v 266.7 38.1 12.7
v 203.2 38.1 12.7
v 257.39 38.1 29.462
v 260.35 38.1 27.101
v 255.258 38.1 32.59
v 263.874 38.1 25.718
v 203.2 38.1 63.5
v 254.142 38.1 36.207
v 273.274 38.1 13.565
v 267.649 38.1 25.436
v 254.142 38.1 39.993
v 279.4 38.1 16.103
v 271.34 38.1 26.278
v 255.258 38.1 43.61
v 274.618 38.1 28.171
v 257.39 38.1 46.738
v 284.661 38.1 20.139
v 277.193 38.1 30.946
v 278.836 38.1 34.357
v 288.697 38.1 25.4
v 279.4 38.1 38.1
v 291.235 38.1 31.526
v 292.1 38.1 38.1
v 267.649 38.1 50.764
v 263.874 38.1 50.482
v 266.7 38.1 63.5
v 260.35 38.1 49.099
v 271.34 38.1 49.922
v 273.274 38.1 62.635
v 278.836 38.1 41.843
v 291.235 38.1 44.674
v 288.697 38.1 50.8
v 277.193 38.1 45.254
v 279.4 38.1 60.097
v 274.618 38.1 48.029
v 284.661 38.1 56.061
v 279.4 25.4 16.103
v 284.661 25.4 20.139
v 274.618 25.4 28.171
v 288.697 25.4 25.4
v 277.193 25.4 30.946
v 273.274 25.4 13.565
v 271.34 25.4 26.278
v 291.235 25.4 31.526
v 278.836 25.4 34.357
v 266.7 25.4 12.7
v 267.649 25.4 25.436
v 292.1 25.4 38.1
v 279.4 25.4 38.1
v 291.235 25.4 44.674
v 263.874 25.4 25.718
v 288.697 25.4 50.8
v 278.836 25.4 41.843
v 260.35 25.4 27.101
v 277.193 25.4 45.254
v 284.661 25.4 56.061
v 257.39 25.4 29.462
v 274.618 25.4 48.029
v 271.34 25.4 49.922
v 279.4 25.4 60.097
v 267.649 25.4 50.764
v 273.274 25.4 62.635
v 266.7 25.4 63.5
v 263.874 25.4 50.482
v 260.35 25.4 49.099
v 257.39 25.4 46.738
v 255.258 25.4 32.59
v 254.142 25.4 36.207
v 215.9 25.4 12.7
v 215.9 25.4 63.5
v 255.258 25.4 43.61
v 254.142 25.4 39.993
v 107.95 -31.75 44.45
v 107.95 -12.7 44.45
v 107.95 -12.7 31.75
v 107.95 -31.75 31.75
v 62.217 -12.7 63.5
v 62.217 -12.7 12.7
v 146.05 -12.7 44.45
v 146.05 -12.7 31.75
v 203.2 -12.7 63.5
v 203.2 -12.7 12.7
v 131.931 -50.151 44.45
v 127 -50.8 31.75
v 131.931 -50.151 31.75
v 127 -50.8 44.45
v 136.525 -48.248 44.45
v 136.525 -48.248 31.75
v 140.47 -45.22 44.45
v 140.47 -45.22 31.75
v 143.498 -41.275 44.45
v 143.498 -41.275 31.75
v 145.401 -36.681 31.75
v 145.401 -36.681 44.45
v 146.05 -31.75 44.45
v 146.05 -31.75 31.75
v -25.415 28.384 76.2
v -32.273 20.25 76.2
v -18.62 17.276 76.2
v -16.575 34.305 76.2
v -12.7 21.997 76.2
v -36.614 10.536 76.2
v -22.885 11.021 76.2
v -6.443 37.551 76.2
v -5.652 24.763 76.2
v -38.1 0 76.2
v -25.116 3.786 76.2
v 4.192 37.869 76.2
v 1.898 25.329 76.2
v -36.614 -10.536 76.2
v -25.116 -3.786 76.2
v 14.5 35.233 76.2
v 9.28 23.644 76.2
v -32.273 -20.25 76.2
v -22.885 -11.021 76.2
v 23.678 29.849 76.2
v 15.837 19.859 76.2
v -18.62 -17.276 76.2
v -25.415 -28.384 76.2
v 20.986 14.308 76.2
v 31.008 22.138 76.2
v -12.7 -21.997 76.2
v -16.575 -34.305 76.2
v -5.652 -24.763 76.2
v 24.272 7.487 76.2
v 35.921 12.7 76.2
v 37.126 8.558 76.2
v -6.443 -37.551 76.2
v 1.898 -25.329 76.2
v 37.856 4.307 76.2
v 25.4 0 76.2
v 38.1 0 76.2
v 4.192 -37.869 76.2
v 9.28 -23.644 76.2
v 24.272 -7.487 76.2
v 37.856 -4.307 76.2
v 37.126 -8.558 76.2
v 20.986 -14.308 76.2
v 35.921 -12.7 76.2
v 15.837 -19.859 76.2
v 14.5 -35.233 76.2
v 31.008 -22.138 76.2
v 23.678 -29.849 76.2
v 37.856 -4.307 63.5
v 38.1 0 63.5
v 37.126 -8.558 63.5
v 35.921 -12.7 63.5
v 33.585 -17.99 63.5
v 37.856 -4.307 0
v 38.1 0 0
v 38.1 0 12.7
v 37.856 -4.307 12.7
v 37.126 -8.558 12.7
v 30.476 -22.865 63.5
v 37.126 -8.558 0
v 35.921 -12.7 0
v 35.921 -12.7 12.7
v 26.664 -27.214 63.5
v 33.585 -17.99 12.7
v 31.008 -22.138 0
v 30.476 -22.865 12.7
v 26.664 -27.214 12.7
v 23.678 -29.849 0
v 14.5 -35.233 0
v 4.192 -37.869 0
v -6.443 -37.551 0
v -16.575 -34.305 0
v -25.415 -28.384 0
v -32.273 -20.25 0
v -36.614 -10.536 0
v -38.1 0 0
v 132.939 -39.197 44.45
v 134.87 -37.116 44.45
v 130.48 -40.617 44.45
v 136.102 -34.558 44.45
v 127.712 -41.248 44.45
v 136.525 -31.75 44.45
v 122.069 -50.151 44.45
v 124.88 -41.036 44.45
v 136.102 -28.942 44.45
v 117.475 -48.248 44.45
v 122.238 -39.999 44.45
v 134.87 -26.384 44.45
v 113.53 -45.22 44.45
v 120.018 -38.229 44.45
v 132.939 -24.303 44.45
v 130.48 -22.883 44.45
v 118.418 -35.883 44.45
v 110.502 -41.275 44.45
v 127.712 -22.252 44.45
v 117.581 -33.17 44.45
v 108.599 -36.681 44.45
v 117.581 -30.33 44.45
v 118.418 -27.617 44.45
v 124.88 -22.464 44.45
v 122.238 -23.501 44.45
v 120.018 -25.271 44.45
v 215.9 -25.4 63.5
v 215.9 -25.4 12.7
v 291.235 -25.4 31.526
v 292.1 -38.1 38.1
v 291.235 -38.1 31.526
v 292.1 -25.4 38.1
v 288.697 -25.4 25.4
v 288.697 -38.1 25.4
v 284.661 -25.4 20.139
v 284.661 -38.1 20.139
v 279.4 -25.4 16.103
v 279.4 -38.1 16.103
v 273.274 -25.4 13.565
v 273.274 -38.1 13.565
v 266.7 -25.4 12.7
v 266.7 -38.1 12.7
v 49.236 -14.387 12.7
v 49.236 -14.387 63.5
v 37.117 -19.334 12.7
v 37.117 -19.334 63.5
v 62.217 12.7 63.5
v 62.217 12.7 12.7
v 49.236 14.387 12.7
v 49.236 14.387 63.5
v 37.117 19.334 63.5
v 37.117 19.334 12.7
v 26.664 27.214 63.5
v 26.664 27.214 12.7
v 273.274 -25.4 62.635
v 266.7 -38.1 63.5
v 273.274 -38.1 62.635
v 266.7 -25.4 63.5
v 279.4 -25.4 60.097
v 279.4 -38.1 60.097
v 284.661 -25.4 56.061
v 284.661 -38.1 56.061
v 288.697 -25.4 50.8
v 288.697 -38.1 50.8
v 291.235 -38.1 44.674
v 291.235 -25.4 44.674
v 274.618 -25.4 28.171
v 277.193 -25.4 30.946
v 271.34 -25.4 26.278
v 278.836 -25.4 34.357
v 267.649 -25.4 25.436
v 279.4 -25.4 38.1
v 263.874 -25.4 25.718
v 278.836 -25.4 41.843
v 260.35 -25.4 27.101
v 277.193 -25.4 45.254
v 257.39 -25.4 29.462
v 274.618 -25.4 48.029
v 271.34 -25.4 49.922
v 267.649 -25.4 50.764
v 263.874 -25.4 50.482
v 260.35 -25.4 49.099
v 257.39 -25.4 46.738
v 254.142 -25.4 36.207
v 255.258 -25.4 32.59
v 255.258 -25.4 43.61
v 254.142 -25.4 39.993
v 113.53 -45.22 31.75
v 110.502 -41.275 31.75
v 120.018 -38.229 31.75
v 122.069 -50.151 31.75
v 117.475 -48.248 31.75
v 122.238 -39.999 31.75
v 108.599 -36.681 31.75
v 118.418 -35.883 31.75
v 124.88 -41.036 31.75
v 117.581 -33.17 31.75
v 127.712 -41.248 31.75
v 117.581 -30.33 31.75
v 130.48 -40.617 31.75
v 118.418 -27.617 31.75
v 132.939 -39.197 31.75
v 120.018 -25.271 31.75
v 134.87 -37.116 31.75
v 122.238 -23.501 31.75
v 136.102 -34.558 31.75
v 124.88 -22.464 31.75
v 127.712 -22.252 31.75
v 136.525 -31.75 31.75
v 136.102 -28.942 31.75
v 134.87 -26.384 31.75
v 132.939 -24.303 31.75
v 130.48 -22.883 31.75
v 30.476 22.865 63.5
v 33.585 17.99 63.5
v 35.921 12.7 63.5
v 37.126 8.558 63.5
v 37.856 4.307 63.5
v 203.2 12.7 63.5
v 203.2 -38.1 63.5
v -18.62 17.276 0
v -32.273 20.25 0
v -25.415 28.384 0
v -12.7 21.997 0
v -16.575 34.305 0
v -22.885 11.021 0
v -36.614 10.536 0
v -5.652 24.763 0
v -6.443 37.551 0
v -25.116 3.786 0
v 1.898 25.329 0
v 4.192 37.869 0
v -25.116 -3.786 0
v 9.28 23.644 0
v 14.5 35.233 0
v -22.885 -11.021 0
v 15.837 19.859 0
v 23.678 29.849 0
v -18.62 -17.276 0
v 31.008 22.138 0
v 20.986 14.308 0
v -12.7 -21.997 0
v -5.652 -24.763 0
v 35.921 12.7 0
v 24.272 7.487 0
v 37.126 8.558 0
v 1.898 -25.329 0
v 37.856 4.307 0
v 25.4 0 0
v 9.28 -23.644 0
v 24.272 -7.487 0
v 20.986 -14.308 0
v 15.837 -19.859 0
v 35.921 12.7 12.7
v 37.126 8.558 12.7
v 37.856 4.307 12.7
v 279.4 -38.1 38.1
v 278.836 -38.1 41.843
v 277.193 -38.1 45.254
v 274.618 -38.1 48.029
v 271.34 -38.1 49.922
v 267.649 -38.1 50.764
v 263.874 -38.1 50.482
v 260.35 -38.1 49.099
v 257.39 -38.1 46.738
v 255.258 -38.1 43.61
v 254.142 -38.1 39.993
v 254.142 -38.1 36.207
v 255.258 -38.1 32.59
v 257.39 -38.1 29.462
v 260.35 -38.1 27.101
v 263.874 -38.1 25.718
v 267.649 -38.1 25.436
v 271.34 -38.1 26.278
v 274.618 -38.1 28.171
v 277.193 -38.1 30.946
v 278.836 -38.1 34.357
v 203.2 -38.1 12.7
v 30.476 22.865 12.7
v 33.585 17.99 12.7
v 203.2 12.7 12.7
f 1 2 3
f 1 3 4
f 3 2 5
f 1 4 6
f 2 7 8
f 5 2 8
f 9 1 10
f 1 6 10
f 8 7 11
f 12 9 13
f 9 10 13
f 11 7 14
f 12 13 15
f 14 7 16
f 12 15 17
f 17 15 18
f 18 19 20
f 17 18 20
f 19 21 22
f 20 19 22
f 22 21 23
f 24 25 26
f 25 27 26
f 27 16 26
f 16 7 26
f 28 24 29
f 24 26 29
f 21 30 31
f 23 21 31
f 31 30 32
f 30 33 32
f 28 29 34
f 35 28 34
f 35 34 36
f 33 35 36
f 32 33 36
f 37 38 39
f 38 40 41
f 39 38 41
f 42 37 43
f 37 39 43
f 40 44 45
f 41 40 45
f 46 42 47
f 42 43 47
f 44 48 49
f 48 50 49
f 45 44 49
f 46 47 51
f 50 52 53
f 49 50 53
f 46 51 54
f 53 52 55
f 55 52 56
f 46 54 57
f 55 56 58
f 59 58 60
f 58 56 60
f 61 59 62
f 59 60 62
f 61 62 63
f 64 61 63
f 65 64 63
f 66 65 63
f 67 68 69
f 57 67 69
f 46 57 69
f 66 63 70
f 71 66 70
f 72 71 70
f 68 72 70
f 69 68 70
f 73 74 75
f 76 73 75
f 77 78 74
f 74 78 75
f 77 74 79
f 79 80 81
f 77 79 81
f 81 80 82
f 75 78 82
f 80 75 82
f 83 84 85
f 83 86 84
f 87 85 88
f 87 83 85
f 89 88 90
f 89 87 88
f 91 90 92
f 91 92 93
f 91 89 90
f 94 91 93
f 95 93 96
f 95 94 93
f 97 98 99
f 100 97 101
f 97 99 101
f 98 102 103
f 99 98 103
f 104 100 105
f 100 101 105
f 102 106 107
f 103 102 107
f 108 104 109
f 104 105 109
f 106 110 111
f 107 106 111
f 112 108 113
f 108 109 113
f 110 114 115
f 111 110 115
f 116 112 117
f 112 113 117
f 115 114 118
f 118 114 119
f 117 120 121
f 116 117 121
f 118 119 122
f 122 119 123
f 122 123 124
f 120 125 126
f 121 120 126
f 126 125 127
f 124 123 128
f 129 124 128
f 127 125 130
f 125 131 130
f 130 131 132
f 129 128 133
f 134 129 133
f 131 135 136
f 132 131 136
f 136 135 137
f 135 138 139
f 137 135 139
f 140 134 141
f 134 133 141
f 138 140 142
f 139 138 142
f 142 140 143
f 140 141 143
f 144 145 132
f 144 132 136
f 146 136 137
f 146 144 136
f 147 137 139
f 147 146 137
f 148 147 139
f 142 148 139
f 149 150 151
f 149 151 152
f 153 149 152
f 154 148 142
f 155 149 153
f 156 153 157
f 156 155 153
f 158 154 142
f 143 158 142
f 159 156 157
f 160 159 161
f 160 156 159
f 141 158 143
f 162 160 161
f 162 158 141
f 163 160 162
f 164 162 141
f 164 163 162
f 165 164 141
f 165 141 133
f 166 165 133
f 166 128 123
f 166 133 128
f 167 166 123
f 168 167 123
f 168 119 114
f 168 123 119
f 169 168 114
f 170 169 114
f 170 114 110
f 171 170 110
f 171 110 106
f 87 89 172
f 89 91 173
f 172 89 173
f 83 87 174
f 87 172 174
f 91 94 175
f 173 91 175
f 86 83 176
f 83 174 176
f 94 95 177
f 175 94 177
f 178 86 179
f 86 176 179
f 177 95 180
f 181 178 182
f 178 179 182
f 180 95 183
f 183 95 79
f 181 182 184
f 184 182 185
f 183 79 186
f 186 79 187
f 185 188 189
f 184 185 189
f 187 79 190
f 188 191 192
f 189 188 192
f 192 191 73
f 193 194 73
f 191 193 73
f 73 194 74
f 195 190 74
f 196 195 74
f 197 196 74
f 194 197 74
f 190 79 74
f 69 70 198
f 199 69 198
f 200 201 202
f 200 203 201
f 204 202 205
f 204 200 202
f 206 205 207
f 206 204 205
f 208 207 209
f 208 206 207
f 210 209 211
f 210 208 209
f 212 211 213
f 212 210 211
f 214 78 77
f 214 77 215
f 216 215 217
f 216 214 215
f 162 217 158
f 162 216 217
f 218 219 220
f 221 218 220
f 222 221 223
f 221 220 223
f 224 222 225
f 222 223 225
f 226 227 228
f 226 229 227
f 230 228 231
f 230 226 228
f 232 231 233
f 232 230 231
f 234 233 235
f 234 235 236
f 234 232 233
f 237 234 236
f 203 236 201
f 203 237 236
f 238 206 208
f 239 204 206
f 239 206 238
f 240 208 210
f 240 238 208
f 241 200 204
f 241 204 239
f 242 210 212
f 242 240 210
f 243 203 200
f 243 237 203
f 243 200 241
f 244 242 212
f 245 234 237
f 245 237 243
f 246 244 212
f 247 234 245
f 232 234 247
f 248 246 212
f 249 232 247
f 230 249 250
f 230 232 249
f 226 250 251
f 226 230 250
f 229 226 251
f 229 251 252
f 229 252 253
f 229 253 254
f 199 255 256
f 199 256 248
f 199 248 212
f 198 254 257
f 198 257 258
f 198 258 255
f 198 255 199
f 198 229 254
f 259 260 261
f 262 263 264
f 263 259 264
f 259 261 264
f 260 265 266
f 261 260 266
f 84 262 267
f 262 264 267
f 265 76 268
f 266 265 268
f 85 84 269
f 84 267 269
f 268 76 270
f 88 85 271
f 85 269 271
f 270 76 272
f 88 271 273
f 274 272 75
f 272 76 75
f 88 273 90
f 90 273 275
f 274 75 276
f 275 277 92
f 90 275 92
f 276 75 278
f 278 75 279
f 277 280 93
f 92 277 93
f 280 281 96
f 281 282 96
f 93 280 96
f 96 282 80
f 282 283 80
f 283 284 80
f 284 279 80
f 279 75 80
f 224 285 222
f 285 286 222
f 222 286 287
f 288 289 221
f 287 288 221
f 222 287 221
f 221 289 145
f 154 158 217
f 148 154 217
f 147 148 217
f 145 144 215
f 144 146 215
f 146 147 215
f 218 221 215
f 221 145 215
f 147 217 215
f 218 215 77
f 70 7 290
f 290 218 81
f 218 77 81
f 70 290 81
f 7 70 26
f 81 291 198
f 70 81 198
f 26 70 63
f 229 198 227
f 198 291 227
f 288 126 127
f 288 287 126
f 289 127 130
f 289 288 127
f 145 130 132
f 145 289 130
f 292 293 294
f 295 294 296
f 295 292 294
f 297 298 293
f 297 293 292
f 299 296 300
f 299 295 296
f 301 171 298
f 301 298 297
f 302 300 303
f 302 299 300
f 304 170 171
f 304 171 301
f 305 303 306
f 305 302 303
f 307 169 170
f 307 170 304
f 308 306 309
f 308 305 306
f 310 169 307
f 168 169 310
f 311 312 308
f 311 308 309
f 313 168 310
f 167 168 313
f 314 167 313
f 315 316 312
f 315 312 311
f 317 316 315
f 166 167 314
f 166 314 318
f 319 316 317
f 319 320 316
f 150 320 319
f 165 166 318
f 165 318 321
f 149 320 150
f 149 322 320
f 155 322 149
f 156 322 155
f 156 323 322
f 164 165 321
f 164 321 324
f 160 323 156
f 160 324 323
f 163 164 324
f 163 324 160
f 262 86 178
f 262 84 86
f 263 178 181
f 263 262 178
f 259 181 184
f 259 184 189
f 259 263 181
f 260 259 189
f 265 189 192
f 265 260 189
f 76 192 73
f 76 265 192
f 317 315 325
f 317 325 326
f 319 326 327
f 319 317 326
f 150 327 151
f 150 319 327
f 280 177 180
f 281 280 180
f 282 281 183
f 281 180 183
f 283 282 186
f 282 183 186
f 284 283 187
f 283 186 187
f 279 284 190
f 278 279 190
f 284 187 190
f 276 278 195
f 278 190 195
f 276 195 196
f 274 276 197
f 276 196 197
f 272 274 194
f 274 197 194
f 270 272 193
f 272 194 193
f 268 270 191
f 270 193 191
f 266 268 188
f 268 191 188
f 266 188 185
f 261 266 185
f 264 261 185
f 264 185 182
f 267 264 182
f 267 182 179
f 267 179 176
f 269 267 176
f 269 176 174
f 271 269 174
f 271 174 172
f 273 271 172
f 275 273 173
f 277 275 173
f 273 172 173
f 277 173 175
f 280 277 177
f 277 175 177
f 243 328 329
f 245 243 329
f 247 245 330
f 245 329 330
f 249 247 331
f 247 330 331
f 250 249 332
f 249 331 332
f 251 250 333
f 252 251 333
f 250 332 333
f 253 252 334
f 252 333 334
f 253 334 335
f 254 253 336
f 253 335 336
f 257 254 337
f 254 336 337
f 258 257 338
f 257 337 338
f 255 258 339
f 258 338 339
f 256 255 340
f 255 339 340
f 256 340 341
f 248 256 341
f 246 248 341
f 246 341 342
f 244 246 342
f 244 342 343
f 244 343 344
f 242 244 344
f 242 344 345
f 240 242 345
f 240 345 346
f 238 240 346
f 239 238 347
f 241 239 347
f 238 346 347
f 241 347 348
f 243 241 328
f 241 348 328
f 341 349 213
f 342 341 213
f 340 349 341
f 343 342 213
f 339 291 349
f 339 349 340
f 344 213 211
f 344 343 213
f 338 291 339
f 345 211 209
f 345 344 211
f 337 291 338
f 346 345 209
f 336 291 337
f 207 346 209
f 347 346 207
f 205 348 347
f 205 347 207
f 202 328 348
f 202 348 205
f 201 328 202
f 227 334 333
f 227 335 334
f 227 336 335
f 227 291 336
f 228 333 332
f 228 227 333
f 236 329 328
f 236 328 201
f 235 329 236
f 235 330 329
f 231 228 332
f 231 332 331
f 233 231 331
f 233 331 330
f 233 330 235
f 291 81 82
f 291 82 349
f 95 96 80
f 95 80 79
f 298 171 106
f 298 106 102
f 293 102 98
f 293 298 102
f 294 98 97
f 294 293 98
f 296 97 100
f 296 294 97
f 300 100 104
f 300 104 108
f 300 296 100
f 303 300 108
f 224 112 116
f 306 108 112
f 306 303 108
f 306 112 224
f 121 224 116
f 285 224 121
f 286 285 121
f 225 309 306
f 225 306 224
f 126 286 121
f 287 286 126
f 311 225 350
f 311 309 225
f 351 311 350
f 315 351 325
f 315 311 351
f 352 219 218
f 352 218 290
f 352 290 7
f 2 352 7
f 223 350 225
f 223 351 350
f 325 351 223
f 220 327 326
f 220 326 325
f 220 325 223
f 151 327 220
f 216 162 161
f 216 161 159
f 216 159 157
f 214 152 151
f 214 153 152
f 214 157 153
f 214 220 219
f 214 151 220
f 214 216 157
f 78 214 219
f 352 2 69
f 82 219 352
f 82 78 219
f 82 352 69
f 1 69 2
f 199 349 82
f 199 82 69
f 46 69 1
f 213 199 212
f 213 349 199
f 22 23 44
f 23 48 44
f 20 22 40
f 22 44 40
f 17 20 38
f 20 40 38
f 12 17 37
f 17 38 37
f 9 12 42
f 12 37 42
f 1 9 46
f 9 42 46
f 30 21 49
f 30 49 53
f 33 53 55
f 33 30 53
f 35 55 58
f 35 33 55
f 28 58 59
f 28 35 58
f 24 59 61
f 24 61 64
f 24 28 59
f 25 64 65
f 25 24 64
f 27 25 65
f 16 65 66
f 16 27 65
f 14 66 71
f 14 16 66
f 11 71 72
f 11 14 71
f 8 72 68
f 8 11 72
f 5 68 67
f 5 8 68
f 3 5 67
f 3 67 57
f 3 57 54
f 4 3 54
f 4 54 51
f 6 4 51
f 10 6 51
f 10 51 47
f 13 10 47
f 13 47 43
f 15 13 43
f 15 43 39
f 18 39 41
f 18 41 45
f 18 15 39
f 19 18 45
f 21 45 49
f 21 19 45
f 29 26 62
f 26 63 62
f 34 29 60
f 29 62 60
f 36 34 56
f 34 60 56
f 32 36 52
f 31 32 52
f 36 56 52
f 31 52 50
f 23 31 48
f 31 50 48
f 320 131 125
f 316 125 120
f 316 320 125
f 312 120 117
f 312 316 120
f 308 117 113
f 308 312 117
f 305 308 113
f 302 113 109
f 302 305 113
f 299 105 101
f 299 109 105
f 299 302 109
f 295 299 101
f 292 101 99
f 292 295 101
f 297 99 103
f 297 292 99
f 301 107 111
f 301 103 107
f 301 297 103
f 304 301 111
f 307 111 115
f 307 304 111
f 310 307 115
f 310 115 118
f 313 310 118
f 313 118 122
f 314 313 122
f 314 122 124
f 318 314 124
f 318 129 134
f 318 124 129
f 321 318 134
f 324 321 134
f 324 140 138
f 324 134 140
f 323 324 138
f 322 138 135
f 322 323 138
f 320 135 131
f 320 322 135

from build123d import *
from build123d import SkipClean  # not in build123d's __all__

# Parameters (mm, degrees)
F1_DEPTH    = 76.2
F3_DEPTH    = 12.7
F4_DEPTH    = 12.7
F5_T1_DEPTH = 50.8
F7_DEPTH    = 50.8
F8_R        = 25.39999
F9_R        = 12.7
F10_DEPTH   = 12.7
F13_DEPTH   = 38.1
F14_R       = 19.04999
F15_R       = 9.525
F16_DEPTH   = 12.7


# Not quite as in the source:
# - a fillet or chamfer that OpenCascade refuses, or shapes differently, is made with other operations: its cross-section is extruded or revolved along the edge and cut away or added
# - a fillet or chamfer is up to 0.001 mm smaller than in the source, because OpenCascade refuses the exact size


with BuildPart() as f1:
    # F0 (on Top) → F1 (new body)
    with BuildSketch(Plane.XY):
        with BuildLine():
            Line((-25.4, 0), (-38.1, 0))
            ThreePointArc((-38.1, 0), (-6.4427853895, -37.5513051228), (35.9210244843, -12.7))
            ThreePointArc((35.9210244843, -12.7), (37.5513051228, -6.4427853895), (38.1, 0))
            Line((38.1, 0), (25.4, 0))
            ThreePointArc((25.4, 0), (0, -25.4), (-25.4, 0))
        make_face()
        with BuildLine():
            ThreePointArc((38.1, 0), (37.5513051228, -6.4427853895), (35.9210244843, -12.7))
            Line((35.9210244843, -12.7), (203.2, -12.7))
            Line((203.2, -12.7), (203.2, 0))
            Line((203.2, 0), (38.1, 0))
        make_face()
    extrude(amount=F1_DEPTH)

    # F2 (on face) → F3 (cut)
    with BuildSketch(Plane.XY.offset(76.2)):
        with BuildLine():
            ThreePointArc((38.1, 0), (37.5513051228, -6.4427853895), (35.9210244843, -12.7))
            Line((35.9210244843, -12.7), (203.2, -12.7))
            Line((203.2, -12.7), (203.2, 0))
            Line((203.2, 0), (38.1, 0))
        make_face()
    extrude(amount=-F3_DEPTH, mode=Mode.SUBTRACT)

    # F0 (on Top) → F4 (cut)
    with BuildSketch(Plane.XY):
        with BuildLine():
            ThreePointArc((38.1, 0), (37.5513051228, -6.4427853895), (35.9210244843, -12.7))
            Line((35.9210244843, -12.7), (203.2, -12.7))
            Line((203.2, -12.7), (203.2, 0))
            Line((203.2, 0), (38.1, 0))
        make_face()
    extrude(amount=F4_DEPTH, mode=Mode.SUBTRACT)

    # F5: fillet of radius 50.8 on 1 edges, made by hand

    # F5_s2 → F5_t1 (join)
    with BuildSketch(Plane.XY.offset(12.7)):
        with BuildLine():
            ThreePointArc((62.2170394667, -12.7), (43.0164442378, -16.4683389316), (26.6644454857, -27.2142857143))
            ThreePointArc((26.6644454857, -27.2142857143), (32.1232219008, -20.4867912253), (35.9210244843, -12.7))
            Line((35.9210244843, -12.7), (62.2170394667, -12.7))
        make_face()
    extrude(amount=F5_T1_DEPTH)

    # F6 (on face) → F7 (join, through all)
    with BuildSketch(Plane.XY.offset(63.5)):
        Polygon((215.9, 0), (203.2, 0), (203.2, -12.7), (203.2, -38.1), (292.1, -38.1), (292.1, -25.4), (215.9, -25.4), align=None)
    extrude(amount=-F7_DEPTH)

    # F8 (radius 25.4 in the source; OpenCascade refuses exactly that, so slightly less here)
    f8_edges = [f1.edges().sort_by_distance(p)[0] for p in [
        (292.1, -31.75, 63.5),
        (292.1, -31.75, 12.7),
    ]]
    fillet(f8_edges, radius=F8_R)

    # F9 (on face) → F10 (cut, through all)
    with BuildSketch(Plane.XZ.offset(38.1)):
        with Locations((266.7, 38.1)):
            Circle(F9_R)
    extrude(amount=-F10_DEPTH, mode=Mode.SUBTRACT)

    # F11: F1 across plane


with BuildPart() as f1_1:
    add(f1.part, clean=False)
    with SkipClean():  # cleaning this boolean's faces spoils the solid; the shape is the same uncleaned
        add(f1.part.mirror(Plane.XZ), clean=False)

    # F12 (on face) → F13 (join)
    with BuildSketch(Plane.XZ.offset(12.7)):
        Polygon((146.05, 44.45), (127, 44.45), (107.95, 44.45), (107.95, 31.75), (127, 31.75), (146.05, 31.75), align=None)
    extrude(amount=F13_DEPTH)

    # F14 (radius 19.05 in the source; OpenCascade refuses exactly that, so slightly less here)
    f14_edges = [f1_1.edges().sort_by_distance(p)[0] for p in [
        (107.95, -50.8, 38.1),
        (146.05, -50.8, 38.1),
    ]]
    fillet(f14_edges, radius=F14_R)

    # F15 (on face) → F16 (cut, through all)
    with BuildSketch(Plane.XY.offset(44.45)):
        with Locations((127, -31.75)):
            Circle(F15_R)
    extrude(amount=-F16_DEPTH, mode=Mode.SUBTRACT)


solid = f1_1.part
